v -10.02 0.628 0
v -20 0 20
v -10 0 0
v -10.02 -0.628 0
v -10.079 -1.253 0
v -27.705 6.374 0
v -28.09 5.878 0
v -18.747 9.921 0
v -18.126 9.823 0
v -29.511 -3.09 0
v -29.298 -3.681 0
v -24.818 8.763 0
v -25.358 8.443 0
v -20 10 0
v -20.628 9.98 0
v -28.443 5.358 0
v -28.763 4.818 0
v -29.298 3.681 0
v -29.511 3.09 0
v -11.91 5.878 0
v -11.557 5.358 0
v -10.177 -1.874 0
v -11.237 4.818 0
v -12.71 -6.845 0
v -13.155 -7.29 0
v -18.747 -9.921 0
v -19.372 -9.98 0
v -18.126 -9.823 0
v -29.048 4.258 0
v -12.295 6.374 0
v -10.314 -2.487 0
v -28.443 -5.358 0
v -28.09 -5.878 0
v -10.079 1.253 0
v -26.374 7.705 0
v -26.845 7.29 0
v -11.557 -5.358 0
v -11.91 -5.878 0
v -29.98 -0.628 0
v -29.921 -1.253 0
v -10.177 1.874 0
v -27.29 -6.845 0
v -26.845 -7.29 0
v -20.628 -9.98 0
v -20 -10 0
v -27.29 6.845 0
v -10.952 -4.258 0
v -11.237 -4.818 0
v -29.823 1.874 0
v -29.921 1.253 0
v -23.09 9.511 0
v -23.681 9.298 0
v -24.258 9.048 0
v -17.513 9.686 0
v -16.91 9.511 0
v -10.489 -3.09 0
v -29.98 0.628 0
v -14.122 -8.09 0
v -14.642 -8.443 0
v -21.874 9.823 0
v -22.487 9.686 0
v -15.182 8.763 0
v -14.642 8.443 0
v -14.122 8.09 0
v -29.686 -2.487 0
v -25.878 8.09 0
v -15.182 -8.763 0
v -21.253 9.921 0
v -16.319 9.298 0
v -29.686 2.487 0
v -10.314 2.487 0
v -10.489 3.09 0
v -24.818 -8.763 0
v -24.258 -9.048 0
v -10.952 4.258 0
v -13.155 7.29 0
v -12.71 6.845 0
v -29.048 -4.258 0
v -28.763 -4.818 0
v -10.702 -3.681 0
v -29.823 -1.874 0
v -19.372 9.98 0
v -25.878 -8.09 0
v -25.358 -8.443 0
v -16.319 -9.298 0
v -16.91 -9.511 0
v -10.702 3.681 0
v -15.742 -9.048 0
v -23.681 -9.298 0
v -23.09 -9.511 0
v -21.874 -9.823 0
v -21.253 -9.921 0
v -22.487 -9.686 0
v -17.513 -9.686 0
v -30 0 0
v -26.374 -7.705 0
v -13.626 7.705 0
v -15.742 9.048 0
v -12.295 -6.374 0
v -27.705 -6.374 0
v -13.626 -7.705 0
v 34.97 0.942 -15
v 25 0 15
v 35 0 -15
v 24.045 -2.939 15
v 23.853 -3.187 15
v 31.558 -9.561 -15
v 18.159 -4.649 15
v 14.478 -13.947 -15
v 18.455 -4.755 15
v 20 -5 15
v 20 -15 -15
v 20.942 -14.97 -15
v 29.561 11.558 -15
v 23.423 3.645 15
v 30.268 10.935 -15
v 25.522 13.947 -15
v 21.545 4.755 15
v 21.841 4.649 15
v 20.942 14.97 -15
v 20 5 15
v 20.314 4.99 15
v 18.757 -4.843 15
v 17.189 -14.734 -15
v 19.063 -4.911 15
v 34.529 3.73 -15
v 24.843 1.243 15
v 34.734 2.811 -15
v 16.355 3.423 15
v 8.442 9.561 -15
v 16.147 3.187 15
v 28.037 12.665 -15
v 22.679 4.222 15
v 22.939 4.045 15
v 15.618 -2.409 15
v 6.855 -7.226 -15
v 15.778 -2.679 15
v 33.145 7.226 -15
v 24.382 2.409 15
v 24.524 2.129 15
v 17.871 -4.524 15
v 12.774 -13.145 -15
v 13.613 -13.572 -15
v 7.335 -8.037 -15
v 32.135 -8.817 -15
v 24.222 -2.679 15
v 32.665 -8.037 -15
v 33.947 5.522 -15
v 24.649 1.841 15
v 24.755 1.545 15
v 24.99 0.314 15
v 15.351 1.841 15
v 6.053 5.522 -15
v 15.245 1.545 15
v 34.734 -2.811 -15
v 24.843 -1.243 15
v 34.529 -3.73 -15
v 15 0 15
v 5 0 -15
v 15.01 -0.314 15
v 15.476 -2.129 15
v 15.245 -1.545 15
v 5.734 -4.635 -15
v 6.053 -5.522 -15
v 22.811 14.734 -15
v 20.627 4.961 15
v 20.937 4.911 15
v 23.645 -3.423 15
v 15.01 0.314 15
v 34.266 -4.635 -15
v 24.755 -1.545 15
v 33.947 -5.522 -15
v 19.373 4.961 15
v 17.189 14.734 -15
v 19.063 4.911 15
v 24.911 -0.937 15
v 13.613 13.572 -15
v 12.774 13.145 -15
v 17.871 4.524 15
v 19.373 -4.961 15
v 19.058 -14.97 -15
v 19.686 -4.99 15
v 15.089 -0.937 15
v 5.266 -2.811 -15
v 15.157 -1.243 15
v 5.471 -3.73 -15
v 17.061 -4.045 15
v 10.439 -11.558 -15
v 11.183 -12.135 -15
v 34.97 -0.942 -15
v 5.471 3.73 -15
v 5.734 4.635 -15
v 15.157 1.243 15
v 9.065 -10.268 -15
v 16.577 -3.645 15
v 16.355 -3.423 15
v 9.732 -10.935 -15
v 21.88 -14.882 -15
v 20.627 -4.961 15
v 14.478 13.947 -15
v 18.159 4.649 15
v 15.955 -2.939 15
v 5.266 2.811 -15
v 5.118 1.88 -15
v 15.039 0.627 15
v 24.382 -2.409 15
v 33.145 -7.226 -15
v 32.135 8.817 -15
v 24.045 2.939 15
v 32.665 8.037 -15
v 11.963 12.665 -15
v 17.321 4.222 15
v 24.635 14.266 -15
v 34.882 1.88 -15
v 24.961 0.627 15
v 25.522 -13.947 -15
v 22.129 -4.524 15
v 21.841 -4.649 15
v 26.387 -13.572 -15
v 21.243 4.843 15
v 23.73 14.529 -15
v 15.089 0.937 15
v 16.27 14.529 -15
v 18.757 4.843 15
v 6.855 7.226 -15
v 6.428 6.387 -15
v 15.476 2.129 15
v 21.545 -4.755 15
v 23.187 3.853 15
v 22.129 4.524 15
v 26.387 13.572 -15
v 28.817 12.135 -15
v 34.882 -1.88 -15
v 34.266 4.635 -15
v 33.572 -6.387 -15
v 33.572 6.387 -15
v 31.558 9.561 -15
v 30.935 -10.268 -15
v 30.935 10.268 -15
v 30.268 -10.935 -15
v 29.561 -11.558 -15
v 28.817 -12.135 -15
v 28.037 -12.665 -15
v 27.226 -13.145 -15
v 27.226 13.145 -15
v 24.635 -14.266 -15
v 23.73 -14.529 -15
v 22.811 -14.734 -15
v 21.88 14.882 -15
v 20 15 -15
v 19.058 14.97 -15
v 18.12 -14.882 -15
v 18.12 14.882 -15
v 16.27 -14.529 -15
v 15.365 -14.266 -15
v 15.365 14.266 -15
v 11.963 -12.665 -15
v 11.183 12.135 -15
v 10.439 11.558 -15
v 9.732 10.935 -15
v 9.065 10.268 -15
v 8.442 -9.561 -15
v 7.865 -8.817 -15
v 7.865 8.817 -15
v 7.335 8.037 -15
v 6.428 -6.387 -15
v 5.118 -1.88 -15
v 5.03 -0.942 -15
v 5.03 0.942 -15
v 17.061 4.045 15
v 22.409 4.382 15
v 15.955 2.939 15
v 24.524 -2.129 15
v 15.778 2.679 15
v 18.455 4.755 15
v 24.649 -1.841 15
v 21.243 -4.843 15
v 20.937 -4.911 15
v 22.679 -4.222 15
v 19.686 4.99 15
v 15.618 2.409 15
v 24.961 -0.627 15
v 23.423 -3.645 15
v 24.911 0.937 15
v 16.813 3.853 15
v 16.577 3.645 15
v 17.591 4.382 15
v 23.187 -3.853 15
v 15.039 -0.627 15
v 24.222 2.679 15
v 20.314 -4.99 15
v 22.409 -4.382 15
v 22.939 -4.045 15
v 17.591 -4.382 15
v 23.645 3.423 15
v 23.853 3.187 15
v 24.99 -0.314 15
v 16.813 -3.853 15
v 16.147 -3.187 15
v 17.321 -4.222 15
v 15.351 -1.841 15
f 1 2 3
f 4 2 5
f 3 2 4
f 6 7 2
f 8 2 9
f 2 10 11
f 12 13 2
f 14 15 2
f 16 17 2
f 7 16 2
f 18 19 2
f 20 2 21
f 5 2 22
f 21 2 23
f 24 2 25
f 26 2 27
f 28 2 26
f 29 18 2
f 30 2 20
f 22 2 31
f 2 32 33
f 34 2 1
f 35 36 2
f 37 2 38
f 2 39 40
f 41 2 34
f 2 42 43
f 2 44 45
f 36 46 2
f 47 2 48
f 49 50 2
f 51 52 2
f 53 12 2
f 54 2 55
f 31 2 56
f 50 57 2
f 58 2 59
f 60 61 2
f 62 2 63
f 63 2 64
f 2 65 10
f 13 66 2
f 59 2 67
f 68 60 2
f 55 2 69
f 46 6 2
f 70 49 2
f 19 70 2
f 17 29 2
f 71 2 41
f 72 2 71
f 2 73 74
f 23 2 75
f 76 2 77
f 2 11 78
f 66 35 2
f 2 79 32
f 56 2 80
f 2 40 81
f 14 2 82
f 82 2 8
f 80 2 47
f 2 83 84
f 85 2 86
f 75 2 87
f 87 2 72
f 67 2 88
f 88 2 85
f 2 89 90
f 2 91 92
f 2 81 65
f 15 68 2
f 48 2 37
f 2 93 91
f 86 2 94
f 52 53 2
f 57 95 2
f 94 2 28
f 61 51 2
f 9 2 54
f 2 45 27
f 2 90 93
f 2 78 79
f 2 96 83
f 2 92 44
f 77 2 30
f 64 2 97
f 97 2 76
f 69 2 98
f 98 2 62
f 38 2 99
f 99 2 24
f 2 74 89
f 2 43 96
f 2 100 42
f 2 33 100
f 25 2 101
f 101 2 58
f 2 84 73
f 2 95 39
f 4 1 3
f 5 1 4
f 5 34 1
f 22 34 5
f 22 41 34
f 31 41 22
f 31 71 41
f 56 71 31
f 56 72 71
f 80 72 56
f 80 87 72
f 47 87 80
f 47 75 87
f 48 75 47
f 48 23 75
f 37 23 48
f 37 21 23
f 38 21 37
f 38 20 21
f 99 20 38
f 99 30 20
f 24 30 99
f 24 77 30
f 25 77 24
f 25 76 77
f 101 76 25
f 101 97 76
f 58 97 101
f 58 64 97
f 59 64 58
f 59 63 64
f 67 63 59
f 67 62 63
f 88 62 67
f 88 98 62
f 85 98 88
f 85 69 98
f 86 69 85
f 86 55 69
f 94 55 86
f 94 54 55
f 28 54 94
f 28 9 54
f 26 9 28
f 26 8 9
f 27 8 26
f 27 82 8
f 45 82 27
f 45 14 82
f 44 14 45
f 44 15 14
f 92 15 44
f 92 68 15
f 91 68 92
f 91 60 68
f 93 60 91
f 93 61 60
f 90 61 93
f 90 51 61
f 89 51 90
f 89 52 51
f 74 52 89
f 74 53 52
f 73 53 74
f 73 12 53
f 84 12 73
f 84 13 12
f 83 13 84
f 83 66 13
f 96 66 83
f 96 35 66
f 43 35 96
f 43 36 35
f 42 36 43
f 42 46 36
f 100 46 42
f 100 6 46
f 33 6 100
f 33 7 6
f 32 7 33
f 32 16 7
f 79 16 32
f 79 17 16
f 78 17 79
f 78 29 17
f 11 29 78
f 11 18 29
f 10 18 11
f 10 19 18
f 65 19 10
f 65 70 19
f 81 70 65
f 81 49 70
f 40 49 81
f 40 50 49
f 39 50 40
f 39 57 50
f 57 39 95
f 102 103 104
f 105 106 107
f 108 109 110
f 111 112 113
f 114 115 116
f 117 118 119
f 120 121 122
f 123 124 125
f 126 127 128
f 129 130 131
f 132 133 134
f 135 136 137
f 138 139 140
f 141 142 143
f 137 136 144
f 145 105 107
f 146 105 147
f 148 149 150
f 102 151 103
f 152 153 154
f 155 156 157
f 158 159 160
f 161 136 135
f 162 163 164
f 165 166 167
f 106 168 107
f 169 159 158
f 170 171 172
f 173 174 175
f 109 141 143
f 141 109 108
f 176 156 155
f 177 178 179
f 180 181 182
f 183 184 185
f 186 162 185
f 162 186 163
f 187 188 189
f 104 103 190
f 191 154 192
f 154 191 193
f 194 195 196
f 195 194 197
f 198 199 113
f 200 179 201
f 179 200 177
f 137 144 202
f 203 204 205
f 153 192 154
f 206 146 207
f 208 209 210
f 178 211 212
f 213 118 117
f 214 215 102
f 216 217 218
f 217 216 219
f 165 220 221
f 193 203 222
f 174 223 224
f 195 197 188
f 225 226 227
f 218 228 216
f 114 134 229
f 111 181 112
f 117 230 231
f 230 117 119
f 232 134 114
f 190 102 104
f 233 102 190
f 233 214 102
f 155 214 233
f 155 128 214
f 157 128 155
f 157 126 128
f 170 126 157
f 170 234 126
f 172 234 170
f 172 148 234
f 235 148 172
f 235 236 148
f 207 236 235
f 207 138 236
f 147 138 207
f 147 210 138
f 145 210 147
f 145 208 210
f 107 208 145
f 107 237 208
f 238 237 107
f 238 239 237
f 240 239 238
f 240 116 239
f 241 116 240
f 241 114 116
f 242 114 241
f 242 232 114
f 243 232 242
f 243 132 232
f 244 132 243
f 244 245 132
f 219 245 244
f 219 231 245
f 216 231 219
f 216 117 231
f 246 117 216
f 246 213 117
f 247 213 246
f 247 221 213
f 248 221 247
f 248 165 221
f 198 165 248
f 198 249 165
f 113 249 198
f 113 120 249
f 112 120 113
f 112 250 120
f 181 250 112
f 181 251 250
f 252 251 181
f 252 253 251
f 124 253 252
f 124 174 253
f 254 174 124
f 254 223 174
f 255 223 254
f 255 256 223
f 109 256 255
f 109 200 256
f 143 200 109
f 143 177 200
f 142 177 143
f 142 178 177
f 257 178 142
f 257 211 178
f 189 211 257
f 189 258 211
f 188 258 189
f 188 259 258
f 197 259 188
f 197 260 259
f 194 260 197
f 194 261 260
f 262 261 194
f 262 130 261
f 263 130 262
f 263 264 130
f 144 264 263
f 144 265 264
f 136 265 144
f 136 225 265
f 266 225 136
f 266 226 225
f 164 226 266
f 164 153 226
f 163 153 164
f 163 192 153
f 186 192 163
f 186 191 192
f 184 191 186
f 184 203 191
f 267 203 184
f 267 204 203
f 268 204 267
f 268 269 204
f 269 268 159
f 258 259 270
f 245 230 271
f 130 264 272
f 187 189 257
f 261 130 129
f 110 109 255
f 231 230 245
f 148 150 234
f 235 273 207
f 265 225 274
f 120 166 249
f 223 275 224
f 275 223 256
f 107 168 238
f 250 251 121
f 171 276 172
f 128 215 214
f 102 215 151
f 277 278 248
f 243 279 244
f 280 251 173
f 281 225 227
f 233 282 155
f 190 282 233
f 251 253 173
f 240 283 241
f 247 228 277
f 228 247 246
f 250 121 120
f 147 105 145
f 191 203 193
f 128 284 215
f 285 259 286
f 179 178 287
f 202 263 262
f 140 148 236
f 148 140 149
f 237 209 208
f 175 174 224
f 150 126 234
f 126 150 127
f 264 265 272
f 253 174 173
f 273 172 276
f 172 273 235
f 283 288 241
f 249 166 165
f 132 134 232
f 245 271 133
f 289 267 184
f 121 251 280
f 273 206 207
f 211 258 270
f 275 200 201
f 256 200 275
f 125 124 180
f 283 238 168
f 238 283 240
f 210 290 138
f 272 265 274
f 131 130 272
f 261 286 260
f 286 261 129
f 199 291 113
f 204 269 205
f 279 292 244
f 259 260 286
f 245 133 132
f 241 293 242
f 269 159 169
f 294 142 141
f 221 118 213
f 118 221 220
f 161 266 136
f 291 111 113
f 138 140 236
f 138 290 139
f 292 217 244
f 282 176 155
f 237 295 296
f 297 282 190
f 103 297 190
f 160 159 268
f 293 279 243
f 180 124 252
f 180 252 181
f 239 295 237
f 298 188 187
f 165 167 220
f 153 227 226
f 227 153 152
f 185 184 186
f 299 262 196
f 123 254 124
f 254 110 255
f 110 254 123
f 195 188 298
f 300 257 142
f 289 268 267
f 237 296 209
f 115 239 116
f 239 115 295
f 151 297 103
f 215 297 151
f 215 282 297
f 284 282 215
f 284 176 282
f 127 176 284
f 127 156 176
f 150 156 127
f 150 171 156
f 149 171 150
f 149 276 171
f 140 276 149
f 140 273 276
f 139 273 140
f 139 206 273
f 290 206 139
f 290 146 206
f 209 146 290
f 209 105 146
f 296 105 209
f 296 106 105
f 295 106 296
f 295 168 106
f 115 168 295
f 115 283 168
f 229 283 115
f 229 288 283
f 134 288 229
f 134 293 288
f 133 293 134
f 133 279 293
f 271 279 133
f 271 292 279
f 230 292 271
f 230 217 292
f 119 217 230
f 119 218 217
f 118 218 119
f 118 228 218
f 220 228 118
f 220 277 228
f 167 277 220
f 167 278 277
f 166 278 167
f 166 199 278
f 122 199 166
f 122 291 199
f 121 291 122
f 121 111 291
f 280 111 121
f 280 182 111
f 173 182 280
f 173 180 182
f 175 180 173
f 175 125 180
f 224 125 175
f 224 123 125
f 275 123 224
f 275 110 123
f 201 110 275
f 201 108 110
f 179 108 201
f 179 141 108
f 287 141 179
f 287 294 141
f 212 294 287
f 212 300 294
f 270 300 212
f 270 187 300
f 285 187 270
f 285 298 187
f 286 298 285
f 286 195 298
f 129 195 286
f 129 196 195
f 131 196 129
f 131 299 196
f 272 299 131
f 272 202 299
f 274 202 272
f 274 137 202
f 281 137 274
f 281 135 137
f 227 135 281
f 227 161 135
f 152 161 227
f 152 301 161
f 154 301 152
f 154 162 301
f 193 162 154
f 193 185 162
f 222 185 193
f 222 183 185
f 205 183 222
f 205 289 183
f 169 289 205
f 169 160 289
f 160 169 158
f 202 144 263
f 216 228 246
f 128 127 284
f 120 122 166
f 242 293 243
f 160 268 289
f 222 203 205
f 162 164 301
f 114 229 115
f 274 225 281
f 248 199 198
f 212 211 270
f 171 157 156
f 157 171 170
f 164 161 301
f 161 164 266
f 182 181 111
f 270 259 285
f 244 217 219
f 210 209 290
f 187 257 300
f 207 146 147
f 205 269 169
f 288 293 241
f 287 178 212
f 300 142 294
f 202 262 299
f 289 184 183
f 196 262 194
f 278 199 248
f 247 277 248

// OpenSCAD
// file: ../../lib/shapes/cone.scad
// lib/shapes/cone.scad

/**
 * Creates a cone with the specified height and base radius.
 *
 * @param height The height of the cone.
 * @param base_radius The radius of the base of the cone.
 * @param top_radius The radius of the top of the cone.
 * @param center Boolean to center the cone at the origin.
 * @param $fn The number of fragments (resolution) to render the cone.
 */
module shapeCone(height = 20, base_radius = 10, top_radius = 0, center = false, $fn = 100) {
    cylinder(h = height, r1 = base_radius, r2 = top_radius, center = center, $fn = $fn);
}
// main file
// tests/shapes/test_cone.scad

use <../../lib/shapes/cone.scad>

module testCone() {
    translate([-20, 0, 0])
    shapeCone(height = 20, base_radius = 10);

    translate([20, 0, 0])
    shapeCone(height = 30, base_radius = 15, top_radius = 5, center = true);
}

// Run tests
testCone();
